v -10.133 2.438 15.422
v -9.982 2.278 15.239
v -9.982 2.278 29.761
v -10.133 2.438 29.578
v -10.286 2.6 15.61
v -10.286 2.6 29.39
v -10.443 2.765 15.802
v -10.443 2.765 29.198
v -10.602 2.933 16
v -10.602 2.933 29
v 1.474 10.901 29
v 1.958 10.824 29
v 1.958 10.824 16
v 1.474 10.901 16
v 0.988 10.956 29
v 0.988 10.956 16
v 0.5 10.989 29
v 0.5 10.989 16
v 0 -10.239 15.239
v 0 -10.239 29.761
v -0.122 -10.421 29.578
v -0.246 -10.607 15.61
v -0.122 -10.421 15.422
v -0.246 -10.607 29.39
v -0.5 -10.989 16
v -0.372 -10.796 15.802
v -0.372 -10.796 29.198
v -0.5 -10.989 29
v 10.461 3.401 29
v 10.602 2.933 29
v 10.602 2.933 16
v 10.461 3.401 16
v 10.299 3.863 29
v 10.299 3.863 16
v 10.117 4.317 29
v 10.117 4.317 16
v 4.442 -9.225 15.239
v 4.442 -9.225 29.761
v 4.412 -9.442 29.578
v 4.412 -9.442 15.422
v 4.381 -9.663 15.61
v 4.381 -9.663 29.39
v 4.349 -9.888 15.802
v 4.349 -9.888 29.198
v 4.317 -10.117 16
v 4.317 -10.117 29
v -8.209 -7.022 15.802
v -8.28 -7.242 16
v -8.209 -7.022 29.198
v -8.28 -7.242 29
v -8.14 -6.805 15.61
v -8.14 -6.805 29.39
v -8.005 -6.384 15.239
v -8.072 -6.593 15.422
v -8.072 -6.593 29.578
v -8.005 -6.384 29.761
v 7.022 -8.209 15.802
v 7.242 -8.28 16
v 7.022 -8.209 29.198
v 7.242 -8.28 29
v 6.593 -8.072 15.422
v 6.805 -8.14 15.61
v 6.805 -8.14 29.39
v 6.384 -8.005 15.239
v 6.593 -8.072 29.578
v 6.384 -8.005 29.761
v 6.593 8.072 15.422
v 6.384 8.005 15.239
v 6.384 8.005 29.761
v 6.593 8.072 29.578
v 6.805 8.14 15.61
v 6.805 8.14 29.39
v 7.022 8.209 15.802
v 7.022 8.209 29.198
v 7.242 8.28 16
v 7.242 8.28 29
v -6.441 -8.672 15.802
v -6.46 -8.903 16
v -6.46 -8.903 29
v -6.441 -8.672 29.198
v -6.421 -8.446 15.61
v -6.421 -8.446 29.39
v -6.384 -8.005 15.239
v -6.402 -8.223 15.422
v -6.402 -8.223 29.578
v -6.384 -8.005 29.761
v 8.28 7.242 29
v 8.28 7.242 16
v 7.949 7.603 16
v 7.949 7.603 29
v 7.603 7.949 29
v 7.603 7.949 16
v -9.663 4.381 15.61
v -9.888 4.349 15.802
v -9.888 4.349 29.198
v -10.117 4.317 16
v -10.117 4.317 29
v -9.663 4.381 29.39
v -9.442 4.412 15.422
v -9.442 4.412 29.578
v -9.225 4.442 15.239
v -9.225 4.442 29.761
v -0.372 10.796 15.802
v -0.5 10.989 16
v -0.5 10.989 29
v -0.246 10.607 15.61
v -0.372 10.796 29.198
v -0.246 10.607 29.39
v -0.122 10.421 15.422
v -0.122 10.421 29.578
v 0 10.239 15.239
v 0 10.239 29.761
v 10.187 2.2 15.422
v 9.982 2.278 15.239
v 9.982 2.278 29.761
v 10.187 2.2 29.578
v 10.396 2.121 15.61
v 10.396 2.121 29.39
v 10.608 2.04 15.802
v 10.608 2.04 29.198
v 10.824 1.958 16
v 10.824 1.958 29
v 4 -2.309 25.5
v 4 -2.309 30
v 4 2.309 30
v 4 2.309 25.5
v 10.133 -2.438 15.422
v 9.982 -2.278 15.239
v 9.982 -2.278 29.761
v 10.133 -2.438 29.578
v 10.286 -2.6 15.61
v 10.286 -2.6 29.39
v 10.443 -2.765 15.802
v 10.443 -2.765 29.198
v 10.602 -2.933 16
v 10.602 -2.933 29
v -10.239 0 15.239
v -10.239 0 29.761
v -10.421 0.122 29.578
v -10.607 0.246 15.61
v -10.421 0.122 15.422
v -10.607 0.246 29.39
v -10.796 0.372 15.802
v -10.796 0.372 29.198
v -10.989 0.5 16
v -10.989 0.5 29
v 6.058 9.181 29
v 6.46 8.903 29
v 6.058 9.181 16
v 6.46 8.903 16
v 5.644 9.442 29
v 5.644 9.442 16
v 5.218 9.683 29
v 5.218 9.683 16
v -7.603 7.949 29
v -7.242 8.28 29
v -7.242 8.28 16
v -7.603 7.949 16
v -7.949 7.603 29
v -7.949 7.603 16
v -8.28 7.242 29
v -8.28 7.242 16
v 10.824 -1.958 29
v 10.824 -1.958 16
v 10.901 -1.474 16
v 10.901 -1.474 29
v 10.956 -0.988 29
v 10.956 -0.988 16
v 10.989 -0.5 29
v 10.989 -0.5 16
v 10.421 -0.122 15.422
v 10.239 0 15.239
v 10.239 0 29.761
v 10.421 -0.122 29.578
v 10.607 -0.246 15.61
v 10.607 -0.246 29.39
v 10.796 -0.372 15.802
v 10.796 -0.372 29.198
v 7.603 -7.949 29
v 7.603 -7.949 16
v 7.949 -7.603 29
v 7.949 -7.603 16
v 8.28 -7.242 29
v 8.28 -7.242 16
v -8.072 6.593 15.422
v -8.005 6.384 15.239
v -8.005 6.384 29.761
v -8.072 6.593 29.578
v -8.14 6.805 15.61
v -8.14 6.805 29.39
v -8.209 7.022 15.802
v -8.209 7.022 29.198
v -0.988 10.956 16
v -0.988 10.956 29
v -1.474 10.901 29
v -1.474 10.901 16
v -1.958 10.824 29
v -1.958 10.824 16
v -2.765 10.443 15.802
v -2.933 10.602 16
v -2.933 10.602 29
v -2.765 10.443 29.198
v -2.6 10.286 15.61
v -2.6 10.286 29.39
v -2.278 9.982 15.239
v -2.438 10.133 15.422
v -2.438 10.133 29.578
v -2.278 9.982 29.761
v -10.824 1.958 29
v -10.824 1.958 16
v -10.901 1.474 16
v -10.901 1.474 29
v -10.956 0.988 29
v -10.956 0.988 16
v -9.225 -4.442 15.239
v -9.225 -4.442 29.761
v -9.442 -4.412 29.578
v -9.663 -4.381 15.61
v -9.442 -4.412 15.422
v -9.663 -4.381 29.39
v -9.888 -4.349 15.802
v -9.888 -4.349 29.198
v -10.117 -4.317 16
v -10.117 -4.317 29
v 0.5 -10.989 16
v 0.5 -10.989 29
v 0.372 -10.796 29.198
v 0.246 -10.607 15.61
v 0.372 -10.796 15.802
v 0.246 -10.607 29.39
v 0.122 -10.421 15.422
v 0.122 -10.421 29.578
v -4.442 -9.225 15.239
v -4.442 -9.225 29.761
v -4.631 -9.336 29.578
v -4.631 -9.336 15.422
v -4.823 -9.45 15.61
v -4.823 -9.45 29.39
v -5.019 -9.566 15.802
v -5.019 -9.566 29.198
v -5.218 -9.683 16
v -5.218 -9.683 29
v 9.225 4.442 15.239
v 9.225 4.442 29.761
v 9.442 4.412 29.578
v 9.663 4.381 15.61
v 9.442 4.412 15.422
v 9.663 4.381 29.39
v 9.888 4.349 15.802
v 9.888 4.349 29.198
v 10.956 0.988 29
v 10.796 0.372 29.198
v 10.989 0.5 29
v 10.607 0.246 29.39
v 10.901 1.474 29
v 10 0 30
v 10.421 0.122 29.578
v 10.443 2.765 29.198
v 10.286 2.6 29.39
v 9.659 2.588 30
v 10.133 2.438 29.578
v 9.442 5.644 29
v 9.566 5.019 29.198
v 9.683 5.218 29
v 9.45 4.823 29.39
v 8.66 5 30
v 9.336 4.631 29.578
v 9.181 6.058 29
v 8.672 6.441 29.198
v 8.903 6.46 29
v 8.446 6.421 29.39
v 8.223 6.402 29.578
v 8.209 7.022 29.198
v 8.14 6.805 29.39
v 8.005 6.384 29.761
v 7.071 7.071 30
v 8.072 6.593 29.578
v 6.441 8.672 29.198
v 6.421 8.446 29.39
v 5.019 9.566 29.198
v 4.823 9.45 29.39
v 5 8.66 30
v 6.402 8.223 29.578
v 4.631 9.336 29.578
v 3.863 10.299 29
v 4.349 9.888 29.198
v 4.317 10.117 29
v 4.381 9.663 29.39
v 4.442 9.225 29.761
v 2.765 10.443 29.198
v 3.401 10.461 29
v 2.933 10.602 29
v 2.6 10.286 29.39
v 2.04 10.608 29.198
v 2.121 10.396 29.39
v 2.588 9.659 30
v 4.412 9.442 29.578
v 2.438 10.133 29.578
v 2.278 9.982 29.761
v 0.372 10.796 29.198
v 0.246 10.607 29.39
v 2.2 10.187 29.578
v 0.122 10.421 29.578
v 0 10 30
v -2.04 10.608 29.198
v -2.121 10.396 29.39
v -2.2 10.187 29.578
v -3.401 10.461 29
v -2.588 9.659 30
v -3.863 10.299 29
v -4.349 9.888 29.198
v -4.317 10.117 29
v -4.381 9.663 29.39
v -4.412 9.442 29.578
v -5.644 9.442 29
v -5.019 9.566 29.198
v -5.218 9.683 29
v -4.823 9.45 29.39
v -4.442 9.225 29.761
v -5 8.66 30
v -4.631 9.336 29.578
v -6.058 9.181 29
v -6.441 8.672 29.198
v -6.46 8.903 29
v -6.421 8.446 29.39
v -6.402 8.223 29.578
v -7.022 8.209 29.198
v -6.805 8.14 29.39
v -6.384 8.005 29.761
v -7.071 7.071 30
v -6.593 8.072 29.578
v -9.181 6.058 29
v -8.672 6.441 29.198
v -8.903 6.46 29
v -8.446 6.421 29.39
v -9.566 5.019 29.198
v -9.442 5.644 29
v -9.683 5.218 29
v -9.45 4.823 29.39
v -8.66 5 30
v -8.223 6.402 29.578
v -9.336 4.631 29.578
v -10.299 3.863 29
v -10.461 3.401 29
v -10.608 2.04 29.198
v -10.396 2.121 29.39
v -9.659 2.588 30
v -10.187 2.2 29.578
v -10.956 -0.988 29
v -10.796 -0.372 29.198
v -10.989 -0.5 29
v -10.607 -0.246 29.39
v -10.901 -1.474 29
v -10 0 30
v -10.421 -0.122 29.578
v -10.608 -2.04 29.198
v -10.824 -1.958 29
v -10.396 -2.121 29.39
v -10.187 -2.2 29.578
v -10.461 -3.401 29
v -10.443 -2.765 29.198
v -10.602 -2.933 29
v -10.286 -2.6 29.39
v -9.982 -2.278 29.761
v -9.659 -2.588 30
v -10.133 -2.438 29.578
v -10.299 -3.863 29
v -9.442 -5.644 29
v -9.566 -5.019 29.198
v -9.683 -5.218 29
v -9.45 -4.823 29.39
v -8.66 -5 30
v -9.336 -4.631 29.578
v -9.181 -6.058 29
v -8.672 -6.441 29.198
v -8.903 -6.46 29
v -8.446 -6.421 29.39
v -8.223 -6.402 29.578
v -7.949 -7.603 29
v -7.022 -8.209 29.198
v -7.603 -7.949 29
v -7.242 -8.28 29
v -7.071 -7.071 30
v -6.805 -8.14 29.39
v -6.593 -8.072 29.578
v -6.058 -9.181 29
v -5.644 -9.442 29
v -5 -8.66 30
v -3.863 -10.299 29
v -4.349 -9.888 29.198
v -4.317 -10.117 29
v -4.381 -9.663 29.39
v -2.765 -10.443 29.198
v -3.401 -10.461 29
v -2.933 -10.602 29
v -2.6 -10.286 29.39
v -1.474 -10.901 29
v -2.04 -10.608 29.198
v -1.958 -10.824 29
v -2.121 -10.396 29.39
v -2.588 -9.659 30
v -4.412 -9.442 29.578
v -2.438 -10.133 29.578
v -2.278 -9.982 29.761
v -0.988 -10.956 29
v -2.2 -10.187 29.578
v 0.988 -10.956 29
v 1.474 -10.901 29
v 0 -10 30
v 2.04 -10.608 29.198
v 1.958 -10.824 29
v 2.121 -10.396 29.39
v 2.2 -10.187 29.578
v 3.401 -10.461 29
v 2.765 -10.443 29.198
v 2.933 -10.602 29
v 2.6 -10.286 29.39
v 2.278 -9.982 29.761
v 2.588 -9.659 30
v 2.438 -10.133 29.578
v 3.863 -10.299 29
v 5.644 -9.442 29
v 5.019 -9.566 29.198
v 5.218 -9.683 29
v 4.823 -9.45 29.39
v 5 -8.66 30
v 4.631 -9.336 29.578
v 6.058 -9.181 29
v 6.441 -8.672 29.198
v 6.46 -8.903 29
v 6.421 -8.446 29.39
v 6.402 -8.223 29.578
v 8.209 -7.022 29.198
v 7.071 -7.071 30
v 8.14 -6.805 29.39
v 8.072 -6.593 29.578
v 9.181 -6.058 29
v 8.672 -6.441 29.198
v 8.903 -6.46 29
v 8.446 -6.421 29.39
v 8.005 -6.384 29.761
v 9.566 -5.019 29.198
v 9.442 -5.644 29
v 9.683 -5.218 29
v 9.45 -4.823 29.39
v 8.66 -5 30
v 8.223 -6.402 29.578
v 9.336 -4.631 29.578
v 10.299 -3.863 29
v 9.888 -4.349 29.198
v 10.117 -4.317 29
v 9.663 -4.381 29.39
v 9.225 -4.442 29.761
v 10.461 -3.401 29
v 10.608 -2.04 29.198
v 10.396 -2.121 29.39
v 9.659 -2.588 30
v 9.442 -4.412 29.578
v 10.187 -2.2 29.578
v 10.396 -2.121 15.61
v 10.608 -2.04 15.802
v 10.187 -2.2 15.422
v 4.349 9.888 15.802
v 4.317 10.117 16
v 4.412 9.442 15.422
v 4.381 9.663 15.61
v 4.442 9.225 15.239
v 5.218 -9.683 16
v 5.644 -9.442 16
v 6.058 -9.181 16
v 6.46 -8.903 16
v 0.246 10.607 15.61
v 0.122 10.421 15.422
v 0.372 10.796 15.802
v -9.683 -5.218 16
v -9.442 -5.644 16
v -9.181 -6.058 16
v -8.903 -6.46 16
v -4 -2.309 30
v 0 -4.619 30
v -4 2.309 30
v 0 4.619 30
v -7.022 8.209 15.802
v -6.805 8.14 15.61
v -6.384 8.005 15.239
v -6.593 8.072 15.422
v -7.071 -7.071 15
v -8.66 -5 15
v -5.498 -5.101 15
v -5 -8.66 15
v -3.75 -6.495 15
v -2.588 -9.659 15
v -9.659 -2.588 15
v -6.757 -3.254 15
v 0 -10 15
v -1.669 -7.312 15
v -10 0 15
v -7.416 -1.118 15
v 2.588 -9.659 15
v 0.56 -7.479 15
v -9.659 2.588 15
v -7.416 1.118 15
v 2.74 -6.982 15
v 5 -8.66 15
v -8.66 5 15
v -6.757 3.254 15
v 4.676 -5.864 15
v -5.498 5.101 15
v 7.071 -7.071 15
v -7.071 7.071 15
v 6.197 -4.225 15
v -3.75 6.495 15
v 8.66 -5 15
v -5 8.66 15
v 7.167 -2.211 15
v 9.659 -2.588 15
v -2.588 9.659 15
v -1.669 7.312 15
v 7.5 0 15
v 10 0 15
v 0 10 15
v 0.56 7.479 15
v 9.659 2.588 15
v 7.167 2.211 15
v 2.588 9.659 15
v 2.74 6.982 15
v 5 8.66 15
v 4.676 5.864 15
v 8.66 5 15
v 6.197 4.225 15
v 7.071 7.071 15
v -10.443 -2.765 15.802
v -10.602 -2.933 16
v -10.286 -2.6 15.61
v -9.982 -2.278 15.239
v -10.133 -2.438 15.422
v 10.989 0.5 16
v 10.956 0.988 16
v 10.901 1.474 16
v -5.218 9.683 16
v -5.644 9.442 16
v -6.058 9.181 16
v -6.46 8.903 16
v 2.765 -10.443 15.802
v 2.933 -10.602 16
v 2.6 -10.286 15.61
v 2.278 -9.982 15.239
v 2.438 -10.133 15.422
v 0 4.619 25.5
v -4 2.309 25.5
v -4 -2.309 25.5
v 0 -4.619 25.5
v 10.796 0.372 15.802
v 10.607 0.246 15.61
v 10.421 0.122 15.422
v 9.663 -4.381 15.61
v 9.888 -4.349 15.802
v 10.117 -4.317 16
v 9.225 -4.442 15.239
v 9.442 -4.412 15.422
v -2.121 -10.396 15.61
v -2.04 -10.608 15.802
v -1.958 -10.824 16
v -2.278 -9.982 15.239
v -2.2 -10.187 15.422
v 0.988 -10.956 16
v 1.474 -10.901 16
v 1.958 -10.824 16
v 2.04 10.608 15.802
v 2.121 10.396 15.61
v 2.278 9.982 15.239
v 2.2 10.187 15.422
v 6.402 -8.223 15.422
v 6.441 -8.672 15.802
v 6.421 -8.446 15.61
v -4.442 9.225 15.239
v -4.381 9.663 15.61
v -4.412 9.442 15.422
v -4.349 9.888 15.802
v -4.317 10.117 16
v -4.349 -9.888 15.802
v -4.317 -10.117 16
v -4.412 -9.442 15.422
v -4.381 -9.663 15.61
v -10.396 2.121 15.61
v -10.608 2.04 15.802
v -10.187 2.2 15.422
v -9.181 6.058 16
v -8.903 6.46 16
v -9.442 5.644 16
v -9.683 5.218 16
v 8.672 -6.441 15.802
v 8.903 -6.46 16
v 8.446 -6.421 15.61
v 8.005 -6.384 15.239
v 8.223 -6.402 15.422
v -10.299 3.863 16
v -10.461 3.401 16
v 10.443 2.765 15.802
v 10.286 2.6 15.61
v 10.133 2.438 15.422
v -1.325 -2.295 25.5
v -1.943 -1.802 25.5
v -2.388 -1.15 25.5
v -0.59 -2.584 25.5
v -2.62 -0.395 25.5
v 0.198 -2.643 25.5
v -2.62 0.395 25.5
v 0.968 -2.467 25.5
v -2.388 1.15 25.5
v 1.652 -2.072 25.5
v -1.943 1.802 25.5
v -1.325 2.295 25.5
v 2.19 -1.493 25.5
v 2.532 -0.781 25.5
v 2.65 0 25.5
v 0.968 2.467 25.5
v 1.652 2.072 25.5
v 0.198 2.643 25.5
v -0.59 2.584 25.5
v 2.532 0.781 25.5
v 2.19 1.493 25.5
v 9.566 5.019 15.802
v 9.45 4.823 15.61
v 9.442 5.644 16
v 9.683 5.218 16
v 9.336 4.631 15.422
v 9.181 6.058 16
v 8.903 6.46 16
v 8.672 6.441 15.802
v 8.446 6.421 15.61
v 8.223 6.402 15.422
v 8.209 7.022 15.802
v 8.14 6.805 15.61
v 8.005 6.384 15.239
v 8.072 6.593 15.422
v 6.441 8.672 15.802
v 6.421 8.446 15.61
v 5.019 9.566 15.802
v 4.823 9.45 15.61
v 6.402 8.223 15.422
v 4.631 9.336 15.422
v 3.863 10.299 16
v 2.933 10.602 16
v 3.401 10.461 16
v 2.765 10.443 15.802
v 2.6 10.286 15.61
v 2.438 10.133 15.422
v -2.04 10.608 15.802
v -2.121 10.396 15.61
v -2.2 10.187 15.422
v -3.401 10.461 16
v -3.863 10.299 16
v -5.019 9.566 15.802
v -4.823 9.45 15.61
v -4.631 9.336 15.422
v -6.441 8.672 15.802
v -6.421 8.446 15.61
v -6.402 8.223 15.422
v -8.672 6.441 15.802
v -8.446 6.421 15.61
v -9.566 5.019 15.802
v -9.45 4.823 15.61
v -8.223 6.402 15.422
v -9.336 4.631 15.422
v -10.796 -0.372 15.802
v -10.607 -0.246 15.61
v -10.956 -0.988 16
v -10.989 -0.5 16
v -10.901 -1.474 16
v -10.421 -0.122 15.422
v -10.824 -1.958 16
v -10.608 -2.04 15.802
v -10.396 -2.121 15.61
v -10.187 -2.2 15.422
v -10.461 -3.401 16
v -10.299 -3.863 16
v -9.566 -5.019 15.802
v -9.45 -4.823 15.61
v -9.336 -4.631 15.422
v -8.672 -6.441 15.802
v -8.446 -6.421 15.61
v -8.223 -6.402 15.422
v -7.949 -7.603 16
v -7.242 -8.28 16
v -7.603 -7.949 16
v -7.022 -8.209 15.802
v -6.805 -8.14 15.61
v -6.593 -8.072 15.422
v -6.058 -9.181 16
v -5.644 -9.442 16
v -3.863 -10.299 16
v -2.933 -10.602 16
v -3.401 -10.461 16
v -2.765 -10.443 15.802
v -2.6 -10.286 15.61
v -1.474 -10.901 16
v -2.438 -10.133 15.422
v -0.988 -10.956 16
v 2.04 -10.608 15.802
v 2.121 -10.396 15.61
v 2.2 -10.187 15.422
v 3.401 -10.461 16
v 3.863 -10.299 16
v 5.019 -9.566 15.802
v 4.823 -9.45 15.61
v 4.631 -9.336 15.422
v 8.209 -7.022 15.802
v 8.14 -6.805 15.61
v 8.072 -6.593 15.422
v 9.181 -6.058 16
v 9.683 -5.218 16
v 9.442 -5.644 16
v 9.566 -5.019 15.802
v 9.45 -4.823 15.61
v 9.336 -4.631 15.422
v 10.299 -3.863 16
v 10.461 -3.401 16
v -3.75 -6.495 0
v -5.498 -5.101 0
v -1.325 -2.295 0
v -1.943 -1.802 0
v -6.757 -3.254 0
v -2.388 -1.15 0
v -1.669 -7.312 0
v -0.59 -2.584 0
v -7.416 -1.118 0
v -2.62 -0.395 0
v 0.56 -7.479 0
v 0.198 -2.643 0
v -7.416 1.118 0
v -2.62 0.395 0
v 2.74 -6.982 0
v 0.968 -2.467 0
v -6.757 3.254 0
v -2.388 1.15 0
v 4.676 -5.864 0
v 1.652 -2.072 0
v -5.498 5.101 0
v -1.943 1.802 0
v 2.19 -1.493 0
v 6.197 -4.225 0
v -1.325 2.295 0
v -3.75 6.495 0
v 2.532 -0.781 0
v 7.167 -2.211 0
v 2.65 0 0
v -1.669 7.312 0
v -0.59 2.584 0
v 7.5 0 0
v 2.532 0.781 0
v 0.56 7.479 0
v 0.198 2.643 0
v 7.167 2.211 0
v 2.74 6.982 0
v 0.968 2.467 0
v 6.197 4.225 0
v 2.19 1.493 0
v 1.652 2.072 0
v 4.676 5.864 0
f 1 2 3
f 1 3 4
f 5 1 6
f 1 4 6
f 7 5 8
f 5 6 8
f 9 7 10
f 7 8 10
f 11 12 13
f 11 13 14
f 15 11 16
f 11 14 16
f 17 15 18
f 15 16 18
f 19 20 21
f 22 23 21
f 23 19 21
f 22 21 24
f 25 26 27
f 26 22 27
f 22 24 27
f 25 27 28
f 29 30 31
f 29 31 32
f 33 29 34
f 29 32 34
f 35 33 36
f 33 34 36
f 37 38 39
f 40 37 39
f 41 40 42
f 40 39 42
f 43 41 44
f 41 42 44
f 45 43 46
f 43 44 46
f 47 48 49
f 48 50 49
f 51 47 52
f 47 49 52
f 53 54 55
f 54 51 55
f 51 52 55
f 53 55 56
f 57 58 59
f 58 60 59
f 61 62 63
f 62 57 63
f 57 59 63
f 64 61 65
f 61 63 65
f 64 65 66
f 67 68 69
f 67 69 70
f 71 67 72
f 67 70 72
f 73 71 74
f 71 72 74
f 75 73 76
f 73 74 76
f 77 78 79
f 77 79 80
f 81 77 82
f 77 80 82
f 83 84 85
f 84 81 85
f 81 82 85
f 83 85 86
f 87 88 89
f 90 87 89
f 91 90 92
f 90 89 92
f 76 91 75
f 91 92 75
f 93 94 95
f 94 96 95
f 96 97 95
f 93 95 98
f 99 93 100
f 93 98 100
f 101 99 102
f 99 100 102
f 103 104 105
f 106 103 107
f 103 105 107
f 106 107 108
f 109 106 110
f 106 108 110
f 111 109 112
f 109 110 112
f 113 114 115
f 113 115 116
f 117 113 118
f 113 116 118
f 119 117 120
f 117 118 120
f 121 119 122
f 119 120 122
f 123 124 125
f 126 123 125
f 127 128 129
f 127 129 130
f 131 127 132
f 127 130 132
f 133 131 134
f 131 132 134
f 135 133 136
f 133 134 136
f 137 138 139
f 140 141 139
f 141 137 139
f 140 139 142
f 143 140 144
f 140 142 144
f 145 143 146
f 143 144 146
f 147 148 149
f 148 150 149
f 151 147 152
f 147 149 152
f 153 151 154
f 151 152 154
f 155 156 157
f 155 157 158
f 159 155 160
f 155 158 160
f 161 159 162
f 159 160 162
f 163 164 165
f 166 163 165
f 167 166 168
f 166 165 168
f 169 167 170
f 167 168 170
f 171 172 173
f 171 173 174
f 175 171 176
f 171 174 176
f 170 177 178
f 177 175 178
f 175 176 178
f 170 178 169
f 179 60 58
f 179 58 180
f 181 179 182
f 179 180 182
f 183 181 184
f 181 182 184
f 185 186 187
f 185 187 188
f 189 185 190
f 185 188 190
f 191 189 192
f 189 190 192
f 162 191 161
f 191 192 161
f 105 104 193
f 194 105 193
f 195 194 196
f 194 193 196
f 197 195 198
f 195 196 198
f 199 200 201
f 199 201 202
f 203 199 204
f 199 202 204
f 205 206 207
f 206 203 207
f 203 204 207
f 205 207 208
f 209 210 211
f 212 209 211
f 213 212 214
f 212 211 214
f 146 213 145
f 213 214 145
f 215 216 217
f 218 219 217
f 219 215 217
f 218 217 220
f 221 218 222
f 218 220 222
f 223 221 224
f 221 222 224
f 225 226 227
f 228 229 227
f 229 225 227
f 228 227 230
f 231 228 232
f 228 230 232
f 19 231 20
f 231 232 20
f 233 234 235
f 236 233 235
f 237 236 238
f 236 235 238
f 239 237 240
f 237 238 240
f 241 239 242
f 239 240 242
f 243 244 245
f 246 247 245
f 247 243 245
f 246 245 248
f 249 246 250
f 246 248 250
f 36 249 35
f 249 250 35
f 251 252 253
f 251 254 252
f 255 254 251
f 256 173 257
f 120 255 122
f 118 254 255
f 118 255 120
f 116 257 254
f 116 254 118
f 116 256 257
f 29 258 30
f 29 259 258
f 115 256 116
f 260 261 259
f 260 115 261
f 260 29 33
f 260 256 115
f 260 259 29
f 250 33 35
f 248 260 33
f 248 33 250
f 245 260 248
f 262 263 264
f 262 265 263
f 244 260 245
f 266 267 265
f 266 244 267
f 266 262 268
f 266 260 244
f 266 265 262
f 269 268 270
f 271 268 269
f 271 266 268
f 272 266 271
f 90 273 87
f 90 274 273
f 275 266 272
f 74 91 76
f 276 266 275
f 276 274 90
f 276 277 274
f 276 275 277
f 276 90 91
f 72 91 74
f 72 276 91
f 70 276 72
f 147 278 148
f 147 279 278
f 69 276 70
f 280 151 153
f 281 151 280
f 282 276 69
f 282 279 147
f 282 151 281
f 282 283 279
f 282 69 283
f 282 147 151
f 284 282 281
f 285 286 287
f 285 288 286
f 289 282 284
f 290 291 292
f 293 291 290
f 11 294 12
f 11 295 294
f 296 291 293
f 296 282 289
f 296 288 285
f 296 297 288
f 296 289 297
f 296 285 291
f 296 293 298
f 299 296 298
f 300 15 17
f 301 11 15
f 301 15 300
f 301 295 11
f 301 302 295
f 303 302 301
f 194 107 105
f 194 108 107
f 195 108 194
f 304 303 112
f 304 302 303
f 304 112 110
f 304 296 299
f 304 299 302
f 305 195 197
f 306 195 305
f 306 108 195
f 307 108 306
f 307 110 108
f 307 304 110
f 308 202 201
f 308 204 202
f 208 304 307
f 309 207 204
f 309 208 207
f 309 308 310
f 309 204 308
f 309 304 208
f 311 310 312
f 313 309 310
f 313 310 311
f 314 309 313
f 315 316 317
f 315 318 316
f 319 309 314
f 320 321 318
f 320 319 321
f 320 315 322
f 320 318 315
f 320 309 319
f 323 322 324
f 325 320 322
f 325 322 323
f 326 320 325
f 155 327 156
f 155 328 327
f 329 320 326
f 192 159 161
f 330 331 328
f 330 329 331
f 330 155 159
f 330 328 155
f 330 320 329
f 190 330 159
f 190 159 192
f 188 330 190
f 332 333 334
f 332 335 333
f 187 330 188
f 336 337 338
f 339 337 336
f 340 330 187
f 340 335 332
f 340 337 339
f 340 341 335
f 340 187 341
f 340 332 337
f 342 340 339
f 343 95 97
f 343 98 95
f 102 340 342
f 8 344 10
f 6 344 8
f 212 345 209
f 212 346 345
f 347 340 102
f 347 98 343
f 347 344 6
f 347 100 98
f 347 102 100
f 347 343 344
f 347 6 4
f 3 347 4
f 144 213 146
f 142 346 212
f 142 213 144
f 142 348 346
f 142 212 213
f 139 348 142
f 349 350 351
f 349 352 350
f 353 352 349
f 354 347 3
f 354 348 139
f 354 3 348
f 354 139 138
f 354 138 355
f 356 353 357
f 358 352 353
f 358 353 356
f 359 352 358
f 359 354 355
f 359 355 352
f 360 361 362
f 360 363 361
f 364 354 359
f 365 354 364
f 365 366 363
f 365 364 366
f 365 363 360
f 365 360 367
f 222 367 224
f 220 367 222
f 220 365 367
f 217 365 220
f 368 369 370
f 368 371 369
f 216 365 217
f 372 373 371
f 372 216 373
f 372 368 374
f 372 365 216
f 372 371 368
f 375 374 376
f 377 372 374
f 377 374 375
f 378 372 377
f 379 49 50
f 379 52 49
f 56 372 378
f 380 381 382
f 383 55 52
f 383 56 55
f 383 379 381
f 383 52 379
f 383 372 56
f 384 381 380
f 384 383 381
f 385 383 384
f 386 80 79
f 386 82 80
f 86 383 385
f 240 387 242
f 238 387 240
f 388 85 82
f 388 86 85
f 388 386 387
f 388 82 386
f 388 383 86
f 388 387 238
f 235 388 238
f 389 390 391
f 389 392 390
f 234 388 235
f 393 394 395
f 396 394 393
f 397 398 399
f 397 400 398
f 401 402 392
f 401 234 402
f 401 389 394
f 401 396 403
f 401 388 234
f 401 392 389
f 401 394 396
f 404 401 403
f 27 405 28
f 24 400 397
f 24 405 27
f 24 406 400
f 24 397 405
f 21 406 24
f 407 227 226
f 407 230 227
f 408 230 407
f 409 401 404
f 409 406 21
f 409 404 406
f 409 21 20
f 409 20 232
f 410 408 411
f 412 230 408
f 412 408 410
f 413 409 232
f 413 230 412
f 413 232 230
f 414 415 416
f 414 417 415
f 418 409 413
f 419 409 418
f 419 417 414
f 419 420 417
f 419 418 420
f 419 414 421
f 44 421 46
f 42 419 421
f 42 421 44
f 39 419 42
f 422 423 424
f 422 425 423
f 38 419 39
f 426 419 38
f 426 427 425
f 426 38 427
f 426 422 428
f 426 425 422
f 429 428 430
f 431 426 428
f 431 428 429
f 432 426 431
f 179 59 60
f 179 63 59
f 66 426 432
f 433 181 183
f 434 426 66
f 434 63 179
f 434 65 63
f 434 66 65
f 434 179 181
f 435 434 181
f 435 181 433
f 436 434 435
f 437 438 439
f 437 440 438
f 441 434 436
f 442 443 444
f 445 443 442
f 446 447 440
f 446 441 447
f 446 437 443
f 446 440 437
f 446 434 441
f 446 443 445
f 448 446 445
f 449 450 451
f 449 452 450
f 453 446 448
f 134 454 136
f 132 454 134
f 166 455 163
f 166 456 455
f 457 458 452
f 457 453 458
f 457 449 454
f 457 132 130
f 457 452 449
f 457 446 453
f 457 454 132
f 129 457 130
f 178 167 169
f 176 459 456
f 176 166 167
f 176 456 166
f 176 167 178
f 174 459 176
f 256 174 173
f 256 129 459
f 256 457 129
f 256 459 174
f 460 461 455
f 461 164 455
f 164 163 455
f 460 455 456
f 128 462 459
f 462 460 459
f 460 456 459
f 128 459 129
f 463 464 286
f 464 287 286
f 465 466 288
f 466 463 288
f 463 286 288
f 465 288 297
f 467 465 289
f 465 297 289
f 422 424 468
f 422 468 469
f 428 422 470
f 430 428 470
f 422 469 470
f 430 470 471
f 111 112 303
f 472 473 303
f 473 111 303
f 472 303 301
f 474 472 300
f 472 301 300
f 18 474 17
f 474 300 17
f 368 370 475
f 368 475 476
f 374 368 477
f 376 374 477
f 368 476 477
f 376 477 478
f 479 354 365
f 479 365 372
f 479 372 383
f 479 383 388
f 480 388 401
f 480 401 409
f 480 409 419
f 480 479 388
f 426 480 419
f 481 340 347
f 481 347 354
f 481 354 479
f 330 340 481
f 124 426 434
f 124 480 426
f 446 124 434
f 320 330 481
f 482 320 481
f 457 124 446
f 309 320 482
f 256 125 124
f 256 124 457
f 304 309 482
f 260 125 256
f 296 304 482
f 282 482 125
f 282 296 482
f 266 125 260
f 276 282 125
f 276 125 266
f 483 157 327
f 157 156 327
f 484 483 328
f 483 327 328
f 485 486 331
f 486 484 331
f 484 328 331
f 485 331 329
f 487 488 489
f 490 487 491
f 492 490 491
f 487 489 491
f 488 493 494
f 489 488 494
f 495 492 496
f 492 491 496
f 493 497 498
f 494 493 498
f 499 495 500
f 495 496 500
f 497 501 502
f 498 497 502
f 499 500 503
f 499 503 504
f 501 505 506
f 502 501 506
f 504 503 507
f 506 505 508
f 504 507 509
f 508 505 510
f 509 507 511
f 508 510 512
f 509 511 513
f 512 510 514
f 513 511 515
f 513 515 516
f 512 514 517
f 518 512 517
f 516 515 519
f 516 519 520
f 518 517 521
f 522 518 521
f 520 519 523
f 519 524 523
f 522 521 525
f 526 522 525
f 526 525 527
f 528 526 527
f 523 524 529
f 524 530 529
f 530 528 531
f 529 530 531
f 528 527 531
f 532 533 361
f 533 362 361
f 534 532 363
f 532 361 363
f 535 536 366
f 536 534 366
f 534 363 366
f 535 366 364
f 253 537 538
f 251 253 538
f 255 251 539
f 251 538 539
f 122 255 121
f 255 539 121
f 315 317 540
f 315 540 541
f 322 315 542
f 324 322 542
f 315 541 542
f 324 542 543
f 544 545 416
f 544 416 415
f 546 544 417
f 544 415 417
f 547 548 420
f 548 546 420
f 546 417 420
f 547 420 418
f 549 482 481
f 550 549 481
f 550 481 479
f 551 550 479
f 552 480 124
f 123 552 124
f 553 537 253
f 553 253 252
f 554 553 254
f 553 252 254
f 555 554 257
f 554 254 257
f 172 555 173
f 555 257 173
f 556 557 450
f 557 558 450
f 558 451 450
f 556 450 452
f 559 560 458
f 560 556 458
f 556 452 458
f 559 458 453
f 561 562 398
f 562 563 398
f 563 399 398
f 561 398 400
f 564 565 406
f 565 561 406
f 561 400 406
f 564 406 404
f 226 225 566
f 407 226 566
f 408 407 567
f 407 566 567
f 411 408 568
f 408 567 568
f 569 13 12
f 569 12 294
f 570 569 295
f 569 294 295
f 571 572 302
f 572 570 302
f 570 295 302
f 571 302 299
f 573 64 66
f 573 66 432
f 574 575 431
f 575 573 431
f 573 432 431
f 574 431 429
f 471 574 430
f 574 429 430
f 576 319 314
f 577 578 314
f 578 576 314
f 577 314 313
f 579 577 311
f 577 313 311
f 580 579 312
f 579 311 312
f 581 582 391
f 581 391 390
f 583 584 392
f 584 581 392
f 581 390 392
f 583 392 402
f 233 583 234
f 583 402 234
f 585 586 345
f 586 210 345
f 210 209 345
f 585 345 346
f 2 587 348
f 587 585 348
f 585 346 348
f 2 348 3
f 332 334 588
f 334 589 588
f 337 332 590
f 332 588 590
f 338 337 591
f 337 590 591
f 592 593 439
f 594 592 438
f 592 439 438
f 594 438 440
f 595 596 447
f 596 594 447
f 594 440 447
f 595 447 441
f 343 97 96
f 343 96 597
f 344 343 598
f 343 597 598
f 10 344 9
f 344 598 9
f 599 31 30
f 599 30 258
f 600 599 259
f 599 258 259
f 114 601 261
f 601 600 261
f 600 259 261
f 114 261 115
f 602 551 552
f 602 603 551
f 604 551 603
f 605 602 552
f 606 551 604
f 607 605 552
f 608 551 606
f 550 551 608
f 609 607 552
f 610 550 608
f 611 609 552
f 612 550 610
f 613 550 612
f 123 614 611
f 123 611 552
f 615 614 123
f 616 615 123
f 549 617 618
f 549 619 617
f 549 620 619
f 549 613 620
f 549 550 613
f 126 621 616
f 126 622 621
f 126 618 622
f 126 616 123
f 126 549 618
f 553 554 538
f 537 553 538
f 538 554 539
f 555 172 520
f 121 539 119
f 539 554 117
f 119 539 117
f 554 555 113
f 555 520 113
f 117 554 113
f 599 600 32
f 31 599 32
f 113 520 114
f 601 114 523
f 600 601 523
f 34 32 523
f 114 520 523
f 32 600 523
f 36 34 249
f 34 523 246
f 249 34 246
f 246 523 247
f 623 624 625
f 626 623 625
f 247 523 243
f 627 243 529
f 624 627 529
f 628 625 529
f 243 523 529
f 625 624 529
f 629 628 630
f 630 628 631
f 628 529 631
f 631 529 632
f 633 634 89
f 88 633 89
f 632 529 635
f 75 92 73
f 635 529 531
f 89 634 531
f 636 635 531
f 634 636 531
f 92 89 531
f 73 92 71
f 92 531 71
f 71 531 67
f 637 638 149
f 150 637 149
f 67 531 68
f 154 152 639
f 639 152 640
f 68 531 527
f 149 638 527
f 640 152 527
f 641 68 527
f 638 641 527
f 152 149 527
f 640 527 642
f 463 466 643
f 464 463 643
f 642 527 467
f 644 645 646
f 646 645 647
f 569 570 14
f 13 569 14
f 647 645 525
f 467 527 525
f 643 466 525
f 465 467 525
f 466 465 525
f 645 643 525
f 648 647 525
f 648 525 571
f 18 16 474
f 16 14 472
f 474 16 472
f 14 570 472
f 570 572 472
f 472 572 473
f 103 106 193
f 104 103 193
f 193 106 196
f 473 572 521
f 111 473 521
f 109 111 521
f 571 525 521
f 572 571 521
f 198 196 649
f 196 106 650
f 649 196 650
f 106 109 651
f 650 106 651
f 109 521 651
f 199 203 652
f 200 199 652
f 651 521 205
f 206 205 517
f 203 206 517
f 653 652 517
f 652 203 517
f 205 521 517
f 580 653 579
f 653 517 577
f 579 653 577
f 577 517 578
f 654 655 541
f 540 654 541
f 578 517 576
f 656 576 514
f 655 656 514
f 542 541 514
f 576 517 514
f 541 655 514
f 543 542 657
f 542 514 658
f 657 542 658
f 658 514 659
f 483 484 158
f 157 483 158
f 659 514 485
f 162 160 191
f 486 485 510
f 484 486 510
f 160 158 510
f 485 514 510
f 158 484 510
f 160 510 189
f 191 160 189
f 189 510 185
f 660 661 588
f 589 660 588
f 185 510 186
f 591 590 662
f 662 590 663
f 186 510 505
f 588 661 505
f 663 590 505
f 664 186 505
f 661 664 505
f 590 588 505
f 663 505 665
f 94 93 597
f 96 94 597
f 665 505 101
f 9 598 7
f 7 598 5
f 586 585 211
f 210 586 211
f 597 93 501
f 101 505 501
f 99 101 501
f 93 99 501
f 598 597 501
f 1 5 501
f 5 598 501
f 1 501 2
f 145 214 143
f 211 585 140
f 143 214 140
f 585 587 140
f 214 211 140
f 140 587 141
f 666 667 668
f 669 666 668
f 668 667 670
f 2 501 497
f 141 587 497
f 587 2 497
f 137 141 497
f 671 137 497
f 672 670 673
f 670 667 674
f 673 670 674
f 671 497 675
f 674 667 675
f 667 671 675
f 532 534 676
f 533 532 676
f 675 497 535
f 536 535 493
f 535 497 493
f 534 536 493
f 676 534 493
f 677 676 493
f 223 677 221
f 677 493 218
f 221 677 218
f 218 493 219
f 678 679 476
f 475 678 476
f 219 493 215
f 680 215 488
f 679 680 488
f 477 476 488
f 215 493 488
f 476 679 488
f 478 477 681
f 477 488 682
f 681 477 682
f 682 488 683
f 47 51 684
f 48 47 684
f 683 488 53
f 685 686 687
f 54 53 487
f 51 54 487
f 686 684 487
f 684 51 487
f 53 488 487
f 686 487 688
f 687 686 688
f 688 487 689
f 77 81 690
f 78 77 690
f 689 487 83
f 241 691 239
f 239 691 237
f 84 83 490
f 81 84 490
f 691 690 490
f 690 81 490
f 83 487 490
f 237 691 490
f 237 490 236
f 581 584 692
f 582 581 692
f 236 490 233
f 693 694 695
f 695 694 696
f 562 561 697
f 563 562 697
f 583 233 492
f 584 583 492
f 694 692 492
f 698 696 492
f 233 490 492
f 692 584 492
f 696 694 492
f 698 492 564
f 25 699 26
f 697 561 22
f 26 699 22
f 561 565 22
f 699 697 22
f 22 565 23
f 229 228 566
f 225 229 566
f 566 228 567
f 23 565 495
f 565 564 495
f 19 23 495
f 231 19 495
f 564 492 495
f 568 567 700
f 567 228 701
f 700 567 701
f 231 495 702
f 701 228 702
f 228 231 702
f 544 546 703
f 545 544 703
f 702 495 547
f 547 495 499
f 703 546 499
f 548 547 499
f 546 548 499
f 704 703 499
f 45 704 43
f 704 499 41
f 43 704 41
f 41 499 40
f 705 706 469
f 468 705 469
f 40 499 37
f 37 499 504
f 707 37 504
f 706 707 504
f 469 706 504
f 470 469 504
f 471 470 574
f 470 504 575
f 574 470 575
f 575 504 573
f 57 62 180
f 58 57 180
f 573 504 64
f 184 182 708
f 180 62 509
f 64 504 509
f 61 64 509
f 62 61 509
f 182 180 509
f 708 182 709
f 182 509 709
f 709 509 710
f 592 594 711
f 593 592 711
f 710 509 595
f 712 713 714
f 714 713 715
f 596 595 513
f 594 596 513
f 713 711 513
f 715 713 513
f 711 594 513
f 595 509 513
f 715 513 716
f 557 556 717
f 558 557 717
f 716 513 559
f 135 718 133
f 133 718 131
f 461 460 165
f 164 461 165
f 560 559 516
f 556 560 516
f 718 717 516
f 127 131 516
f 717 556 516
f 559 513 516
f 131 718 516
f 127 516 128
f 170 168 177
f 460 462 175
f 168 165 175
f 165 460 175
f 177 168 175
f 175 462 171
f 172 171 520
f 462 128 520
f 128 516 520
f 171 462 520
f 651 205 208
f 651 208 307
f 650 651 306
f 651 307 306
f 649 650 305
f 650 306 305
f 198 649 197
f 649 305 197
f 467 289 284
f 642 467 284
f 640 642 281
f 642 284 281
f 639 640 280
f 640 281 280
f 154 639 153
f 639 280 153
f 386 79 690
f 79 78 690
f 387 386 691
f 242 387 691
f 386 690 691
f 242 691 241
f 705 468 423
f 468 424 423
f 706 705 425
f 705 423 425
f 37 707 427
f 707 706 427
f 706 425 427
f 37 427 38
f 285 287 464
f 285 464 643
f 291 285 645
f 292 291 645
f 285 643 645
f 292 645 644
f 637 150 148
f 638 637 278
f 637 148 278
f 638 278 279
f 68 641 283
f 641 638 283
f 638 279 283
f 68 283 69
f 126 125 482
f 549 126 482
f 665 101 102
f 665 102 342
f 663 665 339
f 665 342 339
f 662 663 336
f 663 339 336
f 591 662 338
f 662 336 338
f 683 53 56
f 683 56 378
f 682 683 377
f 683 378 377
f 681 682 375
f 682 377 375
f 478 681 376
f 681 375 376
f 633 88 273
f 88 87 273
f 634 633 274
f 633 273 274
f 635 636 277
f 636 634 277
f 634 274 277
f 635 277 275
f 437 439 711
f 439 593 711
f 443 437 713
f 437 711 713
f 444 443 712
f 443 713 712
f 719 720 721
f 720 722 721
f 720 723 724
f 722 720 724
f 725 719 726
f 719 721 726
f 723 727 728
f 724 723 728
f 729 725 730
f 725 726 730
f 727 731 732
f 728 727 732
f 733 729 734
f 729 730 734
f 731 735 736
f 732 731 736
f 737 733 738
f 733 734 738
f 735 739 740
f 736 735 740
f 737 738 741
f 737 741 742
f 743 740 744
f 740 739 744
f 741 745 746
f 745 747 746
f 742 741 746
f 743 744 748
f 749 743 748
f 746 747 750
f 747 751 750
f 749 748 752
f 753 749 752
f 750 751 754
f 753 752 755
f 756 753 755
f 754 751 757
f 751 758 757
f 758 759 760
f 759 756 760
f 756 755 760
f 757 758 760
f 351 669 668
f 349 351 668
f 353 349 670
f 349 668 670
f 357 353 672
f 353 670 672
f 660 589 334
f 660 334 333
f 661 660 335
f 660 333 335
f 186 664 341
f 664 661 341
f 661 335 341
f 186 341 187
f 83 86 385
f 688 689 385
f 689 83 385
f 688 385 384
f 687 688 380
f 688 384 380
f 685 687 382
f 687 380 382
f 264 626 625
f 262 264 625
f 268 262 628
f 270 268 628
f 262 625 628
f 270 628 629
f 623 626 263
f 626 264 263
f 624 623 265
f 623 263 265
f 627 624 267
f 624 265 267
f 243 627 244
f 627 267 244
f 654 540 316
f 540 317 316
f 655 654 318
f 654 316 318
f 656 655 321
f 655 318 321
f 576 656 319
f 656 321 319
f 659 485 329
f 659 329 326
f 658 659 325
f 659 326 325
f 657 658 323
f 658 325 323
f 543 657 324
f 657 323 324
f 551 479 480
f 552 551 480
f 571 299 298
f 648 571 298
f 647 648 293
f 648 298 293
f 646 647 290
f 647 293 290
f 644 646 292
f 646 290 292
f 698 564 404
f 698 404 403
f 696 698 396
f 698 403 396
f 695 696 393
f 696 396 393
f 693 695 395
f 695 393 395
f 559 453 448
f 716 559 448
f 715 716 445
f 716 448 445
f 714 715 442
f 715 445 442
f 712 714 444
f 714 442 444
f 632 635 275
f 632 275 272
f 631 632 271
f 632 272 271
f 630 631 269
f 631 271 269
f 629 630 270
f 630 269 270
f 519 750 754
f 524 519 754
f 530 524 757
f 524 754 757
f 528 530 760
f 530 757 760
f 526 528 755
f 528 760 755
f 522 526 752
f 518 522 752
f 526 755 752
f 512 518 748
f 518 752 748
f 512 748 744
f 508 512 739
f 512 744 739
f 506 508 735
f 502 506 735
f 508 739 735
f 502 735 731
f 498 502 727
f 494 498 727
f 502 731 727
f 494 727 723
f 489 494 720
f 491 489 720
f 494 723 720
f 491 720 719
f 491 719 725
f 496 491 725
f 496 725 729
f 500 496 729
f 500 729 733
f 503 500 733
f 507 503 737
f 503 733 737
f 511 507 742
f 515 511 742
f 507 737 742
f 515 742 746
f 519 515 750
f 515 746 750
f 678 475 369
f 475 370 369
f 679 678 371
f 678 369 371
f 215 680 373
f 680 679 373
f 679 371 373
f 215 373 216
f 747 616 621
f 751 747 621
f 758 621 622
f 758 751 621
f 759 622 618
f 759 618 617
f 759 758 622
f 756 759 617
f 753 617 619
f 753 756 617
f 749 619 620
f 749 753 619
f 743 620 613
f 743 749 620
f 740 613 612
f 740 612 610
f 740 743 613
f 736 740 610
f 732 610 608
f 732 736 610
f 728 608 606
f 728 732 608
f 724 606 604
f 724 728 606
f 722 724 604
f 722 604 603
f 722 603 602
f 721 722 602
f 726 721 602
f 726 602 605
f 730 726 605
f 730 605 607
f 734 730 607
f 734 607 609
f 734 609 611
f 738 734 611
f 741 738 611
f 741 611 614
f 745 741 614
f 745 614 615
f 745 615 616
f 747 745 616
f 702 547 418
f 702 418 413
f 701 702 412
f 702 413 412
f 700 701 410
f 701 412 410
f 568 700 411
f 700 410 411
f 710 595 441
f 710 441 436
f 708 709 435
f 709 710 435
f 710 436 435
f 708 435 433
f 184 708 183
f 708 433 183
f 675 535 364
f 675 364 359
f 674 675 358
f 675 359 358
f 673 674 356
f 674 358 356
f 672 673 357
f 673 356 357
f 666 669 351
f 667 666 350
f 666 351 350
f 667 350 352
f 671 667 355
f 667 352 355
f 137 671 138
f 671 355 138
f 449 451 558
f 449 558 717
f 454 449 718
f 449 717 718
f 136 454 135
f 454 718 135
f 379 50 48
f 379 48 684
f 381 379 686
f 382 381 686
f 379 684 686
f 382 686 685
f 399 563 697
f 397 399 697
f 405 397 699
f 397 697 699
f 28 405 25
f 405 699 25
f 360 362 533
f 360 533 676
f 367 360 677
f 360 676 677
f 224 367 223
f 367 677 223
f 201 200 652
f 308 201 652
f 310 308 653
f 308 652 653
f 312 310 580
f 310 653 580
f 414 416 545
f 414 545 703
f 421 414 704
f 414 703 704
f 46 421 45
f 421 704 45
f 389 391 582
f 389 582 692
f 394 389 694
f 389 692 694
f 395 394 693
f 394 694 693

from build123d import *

# Parameters (mm, degrees)
F0_R      = 7.5
F0_R_2    = 2.65
F1_DEPTH  = 15
F2_R      = 11
F3_DEPTH  = 15
F4_DEPTH  = 15
F6_DEPTH  = 4.5
F7_SIZE   = 1
F9_DEPTH  = 25
F10_R     = 2.65
F11_DEPTH = 25


with BuildPart() as f1:
    # F0 (on Top) → F1 (new body)
    with BuildSketch(Plane.XY):
        Circle(F0_R)
        Circle(F0_R_2, mode=Mode.SUBTRACT)
    extrude(amount=F1_DEPTH)

    # F2 (on face) → F3 (join)
    with BuildSketch(Plane.XY.offset(15)):
        Circle(F2_R)
    extrude(amount=F3_DEPTH)

    # F2 (on face) → F4 (join)
    with BuildSketch(Plane.XY.offset(15)):
        Circle(F2_R)
    extrude(amount=F4_DEPTH)

    # F5 (on face) → F6 (cut)
    with BuildSketch(Plane.XY.offset(30)):
        Polygon((4, -2.309401), (4, 2.309401), (0, 4.618802), (-4, 2.309401), (-4, -2.309401), (0, -4.618802), align=None)
    extrude(amount=-F6_DEPTH, mode=Mode.SUBTRACT)

    # F7
    f7_edges = [f1.edges().sort_by_distance(p)[0] for p in [
        (-11, 0, 30),
        (-11, 0, 15),
    ]]
    chamfer(f7_edges, length=F7_SIZE)

    # F8 (on face) → F9 (cut)
    with BuildSketch(Plane.XY.offset(30)):
        Polygon((0, -10.23863), (-0.5, -10.98863), (0, -11.73863), (0.5, -10.98863), align=None)
        Polygon((1.957736, -10.824383), (2.612091, -11.444319), (2.932664, -10.601862), (2.27831, -9.981927), align=None)
        Polygon((4.317304, -10.117356), (5.093201, -10.576141), (5.218273, -9.683472), (4.442375, -9.224687), align=None)
        Polygon((6.460383, -8.903002), (7.318916, -9.177631), (7.242215, -8.279512), (6.383682, -8.004884), align=None)
        Polygon((8.279512, -7.242215), (9.177631, -7.318916), (8.903002, -6.460383), (8.004884, -6.383682), align=None)
        Polygon((9.683472, -5.218273), (10.576141, -5.093201), (10.117356, -4.317304), (9.224687, -4.442375), align=None)
        Polygon((10.601862, -2.932664), (11.444319, -2.612091), (10.824383, -1.957736), (9.981927, -2.27831), align=None)
        Polygon((10.98863, -0.5), (11.73863, 0), (10.98863, 0.5), (10.23863, 0), align=None)
        Polygon((10.824383, 1.957736), (11.444319, 2.612091), (10.601862, 2.932664), (9.981927, 2.27831), align=None)
        Polygon((10.117356, 4.317304), (10.576141, 5.093201), (9.683472, 5.218273), (9.224687, 4.442375), align=None)
        Polygon((8.903002, 6.460383), (9.177631, 7.318916), (8.279512, 7.242215), (8.004884, 6.383682), align=None)
        Polygon((7.242215, 8.279512), (7.318916, 9.177631), (6.460383, 8.903002), (6.383682, 8.004884), align=None)
        Polygon((5.218273, 9.683472), (5.093201, 10.576141), (4.317304, 10.117356), (4.442375, 9.224687), align=None)
        Polygon((2.932664, 10.601862), (2.612091, 11.444319), (1.957736, 10.824383), (2.27831, 9.981927), align=None)
        Polygon((0.5, 10.98863), (0, 11.73863), (-0.5, 10.98863), (0, 10.23863), align=None)
        Polygon((-1.957736, 10.824383), (-2.612091, 11.444319), (-2.932664, 10.601862), (-2.27831, 9.981927), align=None)
        Polygon((-4.317304, 10.117356), (-5.093201, 10.576141), (-5.218273, 9.683472), (-4.442375, 9.224687), align=None)
        Polygon((-6.460383, 8.903002), (-7.318916, 9.177631), (-7.242215, 8.279512), (-6.383682, 8.004884), align=None)
        Polygon((-8.279512, 7.242215), (-9.177631, 7.318916), (-8.903002, 6.460383), (-8.004884, 6.383682), align=None)
        Polygon((-9.683472, 5.218273), (-10.576141, 5.093201), (-10.117356, 4.317304), (-9.224687, 4.442375), align=None)
        Polygon((-10.601862, 2.932664), (-11.444319, 2.612091), (-10.824383, 1.957736), (-9.981927, 2.27831), align=None)
        Polygon((-10.98863, 0.5), (-11.73863, 0), (-10.98863, -0.5), (-10.23863, 0), align=None)
        Polygon((-10.824383, -1.957736), (-11.444319, -2.612091), (-10.601862, -2.932664), (-9.981927, -2.27831), align=None)
        Polygon((-10.117356, -4.317304), (-10.576141, -5.093201), (-9.683472, -5.218273), (-9.224687, -4.442375), align=None)
        Polygon((-8.903002, -6.460383), (-9.177631, -7.318916), (-8.279512, -7.242215), (-8.004884, -6.383682), align=None)
        Polygon((-7.242215, -8.279512), (-7.318916, -9.177631), (-6.460383, -8.903002), (-6.383682, -8.004884), align=None)
        Polygon((-5.218273, -9.683472), (-5.093201, -10.576141), (-4.317304, -10.117356), (-4.442375, -9.224687), align=None)
        Polygon((-2.932664, -10.601862), (-2.612091, -11.444319), (-1.957736, -10.824383), (-2.27831, -9.981927), align=None)
    extrude(amount=-F9_DEPTH, mode=Mode.SUBTRACT)

    # F10 (on face) → F11 (cut)
    with BuildSketch(Plane.XY.offset(25.5)):
        Circle(F10_R)
    extrude(amount=-F11_DEPTH, mode=Mode.SUBTRACT)


solid = f1.part
